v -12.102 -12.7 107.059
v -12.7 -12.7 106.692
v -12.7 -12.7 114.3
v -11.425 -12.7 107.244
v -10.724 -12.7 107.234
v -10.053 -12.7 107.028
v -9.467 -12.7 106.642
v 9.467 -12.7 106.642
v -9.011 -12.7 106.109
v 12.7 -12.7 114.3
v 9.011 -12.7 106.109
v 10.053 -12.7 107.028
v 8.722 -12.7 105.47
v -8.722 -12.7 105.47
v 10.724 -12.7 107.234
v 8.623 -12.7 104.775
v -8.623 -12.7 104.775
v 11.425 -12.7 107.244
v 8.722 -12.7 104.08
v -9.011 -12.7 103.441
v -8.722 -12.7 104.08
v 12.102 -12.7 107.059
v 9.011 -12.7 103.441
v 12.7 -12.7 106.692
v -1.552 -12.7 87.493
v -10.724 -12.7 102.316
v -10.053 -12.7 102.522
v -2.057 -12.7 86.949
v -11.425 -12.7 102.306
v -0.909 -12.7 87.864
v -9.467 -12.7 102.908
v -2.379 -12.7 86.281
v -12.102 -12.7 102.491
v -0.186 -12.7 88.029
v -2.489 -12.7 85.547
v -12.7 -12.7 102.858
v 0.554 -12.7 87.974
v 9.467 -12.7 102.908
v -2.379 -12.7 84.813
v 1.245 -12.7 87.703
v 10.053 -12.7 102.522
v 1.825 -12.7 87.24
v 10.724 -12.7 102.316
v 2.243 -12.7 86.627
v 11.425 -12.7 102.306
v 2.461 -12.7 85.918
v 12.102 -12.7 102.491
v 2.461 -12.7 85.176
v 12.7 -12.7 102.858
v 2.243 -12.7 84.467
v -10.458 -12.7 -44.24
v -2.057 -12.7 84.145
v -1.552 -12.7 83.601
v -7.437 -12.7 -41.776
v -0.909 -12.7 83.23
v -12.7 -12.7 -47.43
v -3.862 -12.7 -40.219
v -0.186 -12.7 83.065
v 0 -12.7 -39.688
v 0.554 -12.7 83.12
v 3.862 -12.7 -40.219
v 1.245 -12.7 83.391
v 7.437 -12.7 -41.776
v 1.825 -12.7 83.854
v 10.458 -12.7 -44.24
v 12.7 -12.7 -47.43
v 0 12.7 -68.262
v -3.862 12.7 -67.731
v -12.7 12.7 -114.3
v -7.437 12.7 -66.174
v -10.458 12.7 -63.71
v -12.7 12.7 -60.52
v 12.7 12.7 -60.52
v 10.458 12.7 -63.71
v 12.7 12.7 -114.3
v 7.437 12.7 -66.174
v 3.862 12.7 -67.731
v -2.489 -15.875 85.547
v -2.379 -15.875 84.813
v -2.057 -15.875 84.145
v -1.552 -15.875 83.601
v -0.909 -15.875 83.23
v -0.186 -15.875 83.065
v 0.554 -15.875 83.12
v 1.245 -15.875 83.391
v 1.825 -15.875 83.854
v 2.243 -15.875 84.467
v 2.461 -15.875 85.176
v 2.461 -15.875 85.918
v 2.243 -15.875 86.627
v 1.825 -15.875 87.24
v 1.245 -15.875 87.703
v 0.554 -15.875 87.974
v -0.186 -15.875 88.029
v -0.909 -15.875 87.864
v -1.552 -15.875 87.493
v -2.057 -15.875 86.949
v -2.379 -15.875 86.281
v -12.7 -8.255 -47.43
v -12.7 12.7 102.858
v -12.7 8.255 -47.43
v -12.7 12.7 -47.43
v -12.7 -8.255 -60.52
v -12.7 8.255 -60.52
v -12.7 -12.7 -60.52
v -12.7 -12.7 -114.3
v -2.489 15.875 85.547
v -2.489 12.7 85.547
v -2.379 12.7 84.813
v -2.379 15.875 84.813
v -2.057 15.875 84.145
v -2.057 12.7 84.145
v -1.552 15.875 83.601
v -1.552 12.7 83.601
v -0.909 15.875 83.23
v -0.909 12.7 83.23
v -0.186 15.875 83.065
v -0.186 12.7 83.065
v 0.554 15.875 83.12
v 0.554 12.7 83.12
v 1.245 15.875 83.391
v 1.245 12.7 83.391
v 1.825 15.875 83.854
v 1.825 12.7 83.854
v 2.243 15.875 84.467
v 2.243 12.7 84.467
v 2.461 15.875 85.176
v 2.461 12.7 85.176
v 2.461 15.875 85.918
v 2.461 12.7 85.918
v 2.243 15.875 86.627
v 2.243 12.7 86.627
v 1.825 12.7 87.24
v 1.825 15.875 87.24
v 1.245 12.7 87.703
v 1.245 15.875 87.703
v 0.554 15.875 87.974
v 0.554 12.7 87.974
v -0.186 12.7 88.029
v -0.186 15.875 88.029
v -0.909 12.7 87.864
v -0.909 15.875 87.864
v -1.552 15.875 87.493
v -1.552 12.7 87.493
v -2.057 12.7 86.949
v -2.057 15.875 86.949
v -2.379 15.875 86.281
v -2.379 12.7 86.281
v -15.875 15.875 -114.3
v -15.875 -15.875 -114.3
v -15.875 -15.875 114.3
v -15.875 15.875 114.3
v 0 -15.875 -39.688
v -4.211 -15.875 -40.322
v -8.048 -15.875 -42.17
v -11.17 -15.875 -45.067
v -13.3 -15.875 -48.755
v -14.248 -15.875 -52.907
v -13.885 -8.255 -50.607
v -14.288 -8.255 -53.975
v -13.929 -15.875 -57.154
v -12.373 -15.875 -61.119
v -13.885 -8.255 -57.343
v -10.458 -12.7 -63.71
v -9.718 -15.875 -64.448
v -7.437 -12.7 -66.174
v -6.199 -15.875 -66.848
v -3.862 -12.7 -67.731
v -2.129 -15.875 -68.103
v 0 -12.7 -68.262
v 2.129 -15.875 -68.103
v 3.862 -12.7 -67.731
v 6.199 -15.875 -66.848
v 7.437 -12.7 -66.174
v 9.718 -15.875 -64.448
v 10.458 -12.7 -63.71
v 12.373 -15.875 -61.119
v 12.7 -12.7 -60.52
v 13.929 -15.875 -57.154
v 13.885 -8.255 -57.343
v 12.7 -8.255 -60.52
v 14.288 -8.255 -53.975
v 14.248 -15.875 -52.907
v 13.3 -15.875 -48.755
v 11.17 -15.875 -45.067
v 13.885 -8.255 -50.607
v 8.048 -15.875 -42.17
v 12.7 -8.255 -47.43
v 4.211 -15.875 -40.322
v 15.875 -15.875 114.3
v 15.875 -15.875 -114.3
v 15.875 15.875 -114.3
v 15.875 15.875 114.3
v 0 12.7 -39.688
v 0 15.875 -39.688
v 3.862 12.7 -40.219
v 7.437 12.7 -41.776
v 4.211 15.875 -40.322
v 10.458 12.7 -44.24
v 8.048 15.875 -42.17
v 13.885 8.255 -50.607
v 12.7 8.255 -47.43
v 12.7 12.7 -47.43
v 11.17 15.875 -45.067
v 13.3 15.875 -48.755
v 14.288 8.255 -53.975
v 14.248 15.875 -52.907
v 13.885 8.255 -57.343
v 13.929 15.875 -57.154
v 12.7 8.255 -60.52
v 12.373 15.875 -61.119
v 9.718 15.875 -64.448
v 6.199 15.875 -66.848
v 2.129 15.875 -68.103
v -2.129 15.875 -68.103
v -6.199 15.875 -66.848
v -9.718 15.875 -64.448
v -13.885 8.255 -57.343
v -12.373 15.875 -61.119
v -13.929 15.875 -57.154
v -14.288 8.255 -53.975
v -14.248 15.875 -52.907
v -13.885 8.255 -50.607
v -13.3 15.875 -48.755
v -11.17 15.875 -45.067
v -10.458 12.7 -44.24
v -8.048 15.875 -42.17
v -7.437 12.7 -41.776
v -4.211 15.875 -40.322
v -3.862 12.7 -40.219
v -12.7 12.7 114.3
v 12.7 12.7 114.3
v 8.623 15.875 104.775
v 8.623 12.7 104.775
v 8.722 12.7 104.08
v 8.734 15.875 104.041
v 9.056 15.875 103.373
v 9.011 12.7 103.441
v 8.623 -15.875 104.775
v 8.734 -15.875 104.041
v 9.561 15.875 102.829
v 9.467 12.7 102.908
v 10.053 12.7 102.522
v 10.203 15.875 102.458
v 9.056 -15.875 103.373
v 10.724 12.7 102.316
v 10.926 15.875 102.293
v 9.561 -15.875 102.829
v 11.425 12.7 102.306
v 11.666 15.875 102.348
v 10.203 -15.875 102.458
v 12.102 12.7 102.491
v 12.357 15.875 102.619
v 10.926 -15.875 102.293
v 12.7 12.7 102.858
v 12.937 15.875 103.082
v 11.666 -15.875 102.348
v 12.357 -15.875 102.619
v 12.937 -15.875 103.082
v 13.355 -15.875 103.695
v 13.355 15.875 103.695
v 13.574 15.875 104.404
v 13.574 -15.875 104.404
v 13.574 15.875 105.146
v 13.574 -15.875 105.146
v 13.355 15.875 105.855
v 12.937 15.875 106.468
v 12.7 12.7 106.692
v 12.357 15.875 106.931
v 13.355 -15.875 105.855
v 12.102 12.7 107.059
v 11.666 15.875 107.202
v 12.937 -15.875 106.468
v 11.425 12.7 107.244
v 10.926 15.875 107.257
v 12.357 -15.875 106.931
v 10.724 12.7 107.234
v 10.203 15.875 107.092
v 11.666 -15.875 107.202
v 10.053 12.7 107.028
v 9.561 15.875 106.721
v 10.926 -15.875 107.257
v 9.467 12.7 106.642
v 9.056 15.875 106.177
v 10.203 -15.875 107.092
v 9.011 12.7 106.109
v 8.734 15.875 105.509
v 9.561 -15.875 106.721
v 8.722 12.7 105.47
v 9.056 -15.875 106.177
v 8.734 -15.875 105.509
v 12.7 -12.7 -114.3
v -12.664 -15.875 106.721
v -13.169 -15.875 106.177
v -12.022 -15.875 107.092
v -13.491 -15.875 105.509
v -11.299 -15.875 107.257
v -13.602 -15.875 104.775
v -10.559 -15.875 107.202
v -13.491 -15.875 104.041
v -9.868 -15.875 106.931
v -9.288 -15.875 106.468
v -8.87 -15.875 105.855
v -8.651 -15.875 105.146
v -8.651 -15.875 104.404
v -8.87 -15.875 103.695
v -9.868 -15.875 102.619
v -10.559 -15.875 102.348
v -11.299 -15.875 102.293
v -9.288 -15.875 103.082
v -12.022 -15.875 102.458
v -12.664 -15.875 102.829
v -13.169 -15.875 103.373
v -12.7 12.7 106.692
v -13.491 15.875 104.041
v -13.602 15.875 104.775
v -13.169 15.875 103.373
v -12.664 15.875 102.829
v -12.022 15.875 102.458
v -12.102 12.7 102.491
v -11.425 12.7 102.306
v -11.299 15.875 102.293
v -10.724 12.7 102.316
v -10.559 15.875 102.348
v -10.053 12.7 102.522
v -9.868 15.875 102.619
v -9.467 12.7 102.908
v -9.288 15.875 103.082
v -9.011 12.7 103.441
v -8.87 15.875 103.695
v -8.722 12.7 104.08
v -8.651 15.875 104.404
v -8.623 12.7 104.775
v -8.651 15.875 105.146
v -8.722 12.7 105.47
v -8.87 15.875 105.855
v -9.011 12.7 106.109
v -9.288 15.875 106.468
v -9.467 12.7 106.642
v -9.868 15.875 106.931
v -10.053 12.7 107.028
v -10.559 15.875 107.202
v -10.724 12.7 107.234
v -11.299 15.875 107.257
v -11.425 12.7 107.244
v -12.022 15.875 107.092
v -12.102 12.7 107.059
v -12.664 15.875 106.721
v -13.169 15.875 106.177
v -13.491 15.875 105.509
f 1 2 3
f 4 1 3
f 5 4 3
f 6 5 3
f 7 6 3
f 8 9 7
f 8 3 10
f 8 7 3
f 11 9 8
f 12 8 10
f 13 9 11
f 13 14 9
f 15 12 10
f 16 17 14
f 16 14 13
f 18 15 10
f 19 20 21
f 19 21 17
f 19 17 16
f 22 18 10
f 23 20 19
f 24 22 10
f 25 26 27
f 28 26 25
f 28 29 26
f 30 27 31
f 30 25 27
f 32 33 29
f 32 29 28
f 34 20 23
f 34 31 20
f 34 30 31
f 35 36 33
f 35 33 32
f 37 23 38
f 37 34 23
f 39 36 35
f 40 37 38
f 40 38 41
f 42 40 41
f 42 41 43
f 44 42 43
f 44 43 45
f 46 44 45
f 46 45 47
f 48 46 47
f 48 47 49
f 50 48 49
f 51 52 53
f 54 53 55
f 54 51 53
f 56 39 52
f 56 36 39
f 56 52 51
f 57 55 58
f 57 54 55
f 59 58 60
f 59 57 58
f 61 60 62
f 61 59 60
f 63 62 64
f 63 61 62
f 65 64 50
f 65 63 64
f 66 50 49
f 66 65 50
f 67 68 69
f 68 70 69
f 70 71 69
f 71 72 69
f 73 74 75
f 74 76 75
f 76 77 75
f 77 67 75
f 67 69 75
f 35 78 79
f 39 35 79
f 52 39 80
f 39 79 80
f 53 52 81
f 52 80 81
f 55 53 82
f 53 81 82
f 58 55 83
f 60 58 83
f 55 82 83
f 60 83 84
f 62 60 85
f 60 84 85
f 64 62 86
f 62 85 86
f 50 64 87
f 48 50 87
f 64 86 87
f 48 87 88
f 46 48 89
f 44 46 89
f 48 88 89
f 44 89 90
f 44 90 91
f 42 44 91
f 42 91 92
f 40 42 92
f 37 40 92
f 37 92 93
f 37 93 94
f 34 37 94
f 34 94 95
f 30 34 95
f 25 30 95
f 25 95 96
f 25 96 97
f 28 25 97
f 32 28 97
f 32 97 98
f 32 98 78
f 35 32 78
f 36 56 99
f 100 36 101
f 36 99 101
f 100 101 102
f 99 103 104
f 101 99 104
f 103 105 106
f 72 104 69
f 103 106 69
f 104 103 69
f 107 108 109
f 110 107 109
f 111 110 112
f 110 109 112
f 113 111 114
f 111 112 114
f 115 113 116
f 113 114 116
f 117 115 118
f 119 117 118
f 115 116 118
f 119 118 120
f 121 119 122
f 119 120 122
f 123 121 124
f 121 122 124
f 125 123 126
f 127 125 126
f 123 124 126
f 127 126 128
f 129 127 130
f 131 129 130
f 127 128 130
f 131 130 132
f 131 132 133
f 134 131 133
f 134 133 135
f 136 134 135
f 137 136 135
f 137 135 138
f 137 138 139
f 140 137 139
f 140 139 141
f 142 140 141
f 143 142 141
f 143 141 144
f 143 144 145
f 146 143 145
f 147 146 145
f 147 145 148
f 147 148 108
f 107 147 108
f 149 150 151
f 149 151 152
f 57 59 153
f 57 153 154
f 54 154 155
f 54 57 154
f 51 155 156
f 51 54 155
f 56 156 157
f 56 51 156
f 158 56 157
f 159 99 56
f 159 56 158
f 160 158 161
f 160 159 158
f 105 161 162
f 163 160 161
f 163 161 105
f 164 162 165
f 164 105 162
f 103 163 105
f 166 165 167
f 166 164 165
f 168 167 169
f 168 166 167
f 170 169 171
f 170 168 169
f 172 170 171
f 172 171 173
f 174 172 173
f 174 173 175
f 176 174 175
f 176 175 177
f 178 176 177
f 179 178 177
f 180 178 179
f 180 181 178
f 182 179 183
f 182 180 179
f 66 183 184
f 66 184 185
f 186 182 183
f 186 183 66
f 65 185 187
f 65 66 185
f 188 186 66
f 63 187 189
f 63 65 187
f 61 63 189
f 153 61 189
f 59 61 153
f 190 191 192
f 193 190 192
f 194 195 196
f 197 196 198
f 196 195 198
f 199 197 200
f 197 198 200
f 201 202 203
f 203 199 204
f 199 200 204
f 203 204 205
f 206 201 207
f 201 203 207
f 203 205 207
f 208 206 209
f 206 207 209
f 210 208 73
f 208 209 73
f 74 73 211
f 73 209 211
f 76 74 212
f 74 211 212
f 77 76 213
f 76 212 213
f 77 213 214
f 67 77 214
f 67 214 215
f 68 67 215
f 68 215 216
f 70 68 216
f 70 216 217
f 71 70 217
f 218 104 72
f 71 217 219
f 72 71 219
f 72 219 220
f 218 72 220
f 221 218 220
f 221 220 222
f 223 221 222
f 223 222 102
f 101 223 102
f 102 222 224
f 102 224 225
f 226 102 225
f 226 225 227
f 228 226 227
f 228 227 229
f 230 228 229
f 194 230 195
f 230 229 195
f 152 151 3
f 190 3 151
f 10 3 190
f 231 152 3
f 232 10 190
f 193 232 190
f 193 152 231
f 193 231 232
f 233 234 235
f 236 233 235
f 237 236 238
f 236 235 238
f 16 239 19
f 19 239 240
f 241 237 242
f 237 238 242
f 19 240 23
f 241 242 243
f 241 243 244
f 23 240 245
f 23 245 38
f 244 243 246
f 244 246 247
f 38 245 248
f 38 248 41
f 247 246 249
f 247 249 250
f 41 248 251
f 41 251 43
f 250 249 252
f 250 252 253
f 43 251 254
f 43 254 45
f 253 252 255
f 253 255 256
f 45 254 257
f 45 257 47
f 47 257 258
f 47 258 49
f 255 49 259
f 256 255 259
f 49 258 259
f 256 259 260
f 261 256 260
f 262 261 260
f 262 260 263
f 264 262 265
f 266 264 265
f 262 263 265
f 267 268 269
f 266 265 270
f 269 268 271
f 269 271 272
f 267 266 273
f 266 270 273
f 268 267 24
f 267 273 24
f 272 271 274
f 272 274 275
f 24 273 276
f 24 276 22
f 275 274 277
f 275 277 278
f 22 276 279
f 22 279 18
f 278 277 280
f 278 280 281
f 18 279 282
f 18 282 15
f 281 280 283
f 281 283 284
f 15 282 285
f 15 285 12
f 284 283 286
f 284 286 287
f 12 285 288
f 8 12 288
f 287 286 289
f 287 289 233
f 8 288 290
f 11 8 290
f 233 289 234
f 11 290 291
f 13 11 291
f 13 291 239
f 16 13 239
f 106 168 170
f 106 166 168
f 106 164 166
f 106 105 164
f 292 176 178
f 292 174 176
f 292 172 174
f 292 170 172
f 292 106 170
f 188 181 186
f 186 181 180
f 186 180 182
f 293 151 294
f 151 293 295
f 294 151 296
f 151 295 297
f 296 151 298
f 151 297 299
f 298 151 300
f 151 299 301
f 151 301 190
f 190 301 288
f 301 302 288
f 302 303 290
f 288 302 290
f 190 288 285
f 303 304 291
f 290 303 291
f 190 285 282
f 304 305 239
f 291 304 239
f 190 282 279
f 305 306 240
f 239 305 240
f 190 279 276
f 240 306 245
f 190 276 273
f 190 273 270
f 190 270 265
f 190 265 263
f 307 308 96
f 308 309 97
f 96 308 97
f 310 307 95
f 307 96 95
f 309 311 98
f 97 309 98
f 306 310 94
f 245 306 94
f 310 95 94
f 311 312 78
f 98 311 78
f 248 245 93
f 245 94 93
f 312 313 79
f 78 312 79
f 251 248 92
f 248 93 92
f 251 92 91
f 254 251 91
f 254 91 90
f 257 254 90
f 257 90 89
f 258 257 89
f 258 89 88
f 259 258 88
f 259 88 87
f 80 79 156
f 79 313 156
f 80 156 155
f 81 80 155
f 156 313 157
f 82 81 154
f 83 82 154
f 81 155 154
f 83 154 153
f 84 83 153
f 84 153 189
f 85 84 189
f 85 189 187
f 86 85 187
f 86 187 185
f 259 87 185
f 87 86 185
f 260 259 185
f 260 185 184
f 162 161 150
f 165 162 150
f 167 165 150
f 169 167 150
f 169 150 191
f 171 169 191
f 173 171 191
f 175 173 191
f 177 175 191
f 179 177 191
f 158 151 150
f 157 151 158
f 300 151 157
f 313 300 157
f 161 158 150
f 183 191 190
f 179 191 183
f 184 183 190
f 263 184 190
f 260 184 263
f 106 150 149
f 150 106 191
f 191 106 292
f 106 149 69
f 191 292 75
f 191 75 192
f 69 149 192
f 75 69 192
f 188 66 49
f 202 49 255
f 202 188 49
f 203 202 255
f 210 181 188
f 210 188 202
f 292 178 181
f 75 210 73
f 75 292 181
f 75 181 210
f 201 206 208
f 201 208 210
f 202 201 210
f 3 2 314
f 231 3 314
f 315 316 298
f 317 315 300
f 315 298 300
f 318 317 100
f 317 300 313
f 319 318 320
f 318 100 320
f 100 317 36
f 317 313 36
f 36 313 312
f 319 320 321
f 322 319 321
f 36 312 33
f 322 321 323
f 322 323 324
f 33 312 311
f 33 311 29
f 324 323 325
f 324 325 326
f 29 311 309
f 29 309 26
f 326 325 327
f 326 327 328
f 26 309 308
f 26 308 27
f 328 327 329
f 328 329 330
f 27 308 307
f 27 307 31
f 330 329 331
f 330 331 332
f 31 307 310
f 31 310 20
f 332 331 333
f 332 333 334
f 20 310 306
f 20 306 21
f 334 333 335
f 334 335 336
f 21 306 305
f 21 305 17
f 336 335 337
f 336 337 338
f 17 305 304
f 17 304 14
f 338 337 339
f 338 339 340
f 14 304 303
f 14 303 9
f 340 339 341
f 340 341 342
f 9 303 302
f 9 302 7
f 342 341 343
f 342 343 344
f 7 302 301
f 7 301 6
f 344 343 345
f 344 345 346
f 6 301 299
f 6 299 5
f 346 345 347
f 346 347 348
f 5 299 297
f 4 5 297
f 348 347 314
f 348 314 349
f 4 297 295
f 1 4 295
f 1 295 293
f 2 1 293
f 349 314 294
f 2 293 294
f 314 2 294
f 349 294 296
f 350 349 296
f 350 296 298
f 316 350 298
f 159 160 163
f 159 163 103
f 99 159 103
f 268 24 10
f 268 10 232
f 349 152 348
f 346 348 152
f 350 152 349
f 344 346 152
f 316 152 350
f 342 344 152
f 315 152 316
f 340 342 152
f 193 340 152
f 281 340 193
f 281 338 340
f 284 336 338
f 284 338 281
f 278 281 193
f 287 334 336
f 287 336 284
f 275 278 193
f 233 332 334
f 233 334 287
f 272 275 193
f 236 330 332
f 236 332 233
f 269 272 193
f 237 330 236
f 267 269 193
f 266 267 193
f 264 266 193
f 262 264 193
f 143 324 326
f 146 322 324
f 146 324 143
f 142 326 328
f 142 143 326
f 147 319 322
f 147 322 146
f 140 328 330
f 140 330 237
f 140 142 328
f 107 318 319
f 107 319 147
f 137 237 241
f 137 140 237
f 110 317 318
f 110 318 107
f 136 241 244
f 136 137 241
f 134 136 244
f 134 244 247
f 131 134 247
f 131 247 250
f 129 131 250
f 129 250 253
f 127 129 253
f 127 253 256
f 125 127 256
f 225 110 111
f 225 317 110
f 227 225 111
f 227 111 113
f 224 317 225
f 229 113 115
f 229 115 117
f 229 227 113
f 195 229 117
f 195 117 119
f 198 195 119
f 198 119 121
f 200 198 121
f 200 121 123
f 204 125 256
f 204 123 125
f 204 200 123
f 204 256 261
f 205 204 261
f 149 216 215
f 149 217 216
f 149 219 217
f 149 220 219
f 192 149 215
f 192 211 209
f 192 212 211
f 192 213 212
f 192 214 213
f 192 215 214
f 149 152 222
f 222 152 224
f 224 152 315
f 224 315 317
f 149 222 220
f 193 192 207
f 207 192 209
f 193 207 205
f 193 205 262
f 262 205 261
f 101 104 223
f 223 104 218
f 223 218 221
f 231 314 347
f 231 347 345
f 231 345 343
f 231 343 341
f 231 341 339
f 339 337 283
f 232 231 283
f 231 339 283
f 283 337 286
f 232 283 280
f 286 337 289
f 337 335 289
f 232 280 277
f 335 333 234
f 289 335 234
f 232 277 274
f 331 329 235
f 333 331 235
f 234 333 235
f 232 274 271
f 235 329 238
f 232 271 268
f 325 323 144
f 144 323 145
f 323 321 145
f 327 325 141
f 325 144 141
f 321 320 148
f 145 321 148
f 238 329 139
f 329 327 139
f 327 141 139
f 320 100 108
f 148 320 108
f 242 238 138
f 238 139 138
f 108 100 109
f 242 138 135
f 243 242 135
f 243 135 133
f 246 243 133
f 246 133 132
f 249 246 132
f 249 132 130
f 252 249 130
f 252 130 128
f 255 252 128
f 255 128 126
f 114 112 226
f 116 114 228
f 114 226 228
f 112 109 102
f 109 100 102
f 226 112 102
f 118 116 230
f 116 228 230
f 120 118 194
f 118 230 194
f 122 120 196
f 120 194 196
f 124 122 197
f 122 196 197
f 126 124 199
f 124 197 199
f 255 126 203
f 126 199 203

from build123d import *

# Parameters (mm, degrees)
BOSS_EXTRUDE1_DEPTH      = 114.3
BOSS_EXTRUDE1_DEPTH_BACK = 114.3
SKETCH3_W                = 31.75
SKETCH3_H                = 31.75
SKETCH3_W_2              = 25.4
SKETCH3_H_2              = 25.4
F_10_CLEARANCE_HOLE1_D   = 4.9784
SKETCH7_R                = 14.2875
CUT_EXTRUDE1_DEPTH       = 7.62
CUT_EXTRUDE2_START       = -7.62
SKETCH8_R                = 14.2875
CUT_EXTRUDE2_DEPTH       = 7.62


with BuildPart() as part:
    # Sketch3 → Boss-Extrude1 (new, two sides: drawn at the far end of the back side and taken through both)
    with BuildSketch(Plane.XY.offset(-BOSS_EXTRUDE1_DEPTH_BACK)):
        Rectangle(SKETCH3_W, SKETCH3_H)
        Rectangle(SKETCH3_W_2, SKETCH3_H_2, mode=Mode.SUBTRACT)
    extrude(amount=BOSS_EXTRUDE1_DEPTH + BOSS_EXTRUDE1_DEPTH_BACK)

    # #10 Clearance Hole1 (through all)
    with Locations(Plane(origin=(0, 15.875, 0), x_dir=(1, 0, 0), z_dir=(0, 1, 0))):
        with Locations((-11.1125, -104.775), (11.1125, -104.775), (0, -85.5472)):
            Hole(F_10_CLEARANCE_HOLE1_D / 2)

    # Sketch7 → Cut-Extrude1 (cut)
    with BuildSketch(Plane(origin=(0, 15.875, 0), x_dir=(1, 0, 0), z_dir=(0, 1, 0))):
        with Locations(Location((0, 53.975, 0), (0, 0, 270))):
            Circle(SKETCH7_R)
    extrude(amount=-CUT_EXTRUDE1_DEPTH, mode=Mode.SUBTRACT)

    # Sketch8 → Cut-Extrude2 (cut)
    with BuildSketch(Plane.XZ.offset(15.875).offset(CUT_EXTRUDE2_START)):
        with Locations(Location((0, -53.975, 0), (0, 0, 90))):
            Circle(SKETCH8_R)
    extrude(amount=CUT_EXTRUDE2_DEPTH, mode=Mode.SUBTRACT)


solid = part.part
